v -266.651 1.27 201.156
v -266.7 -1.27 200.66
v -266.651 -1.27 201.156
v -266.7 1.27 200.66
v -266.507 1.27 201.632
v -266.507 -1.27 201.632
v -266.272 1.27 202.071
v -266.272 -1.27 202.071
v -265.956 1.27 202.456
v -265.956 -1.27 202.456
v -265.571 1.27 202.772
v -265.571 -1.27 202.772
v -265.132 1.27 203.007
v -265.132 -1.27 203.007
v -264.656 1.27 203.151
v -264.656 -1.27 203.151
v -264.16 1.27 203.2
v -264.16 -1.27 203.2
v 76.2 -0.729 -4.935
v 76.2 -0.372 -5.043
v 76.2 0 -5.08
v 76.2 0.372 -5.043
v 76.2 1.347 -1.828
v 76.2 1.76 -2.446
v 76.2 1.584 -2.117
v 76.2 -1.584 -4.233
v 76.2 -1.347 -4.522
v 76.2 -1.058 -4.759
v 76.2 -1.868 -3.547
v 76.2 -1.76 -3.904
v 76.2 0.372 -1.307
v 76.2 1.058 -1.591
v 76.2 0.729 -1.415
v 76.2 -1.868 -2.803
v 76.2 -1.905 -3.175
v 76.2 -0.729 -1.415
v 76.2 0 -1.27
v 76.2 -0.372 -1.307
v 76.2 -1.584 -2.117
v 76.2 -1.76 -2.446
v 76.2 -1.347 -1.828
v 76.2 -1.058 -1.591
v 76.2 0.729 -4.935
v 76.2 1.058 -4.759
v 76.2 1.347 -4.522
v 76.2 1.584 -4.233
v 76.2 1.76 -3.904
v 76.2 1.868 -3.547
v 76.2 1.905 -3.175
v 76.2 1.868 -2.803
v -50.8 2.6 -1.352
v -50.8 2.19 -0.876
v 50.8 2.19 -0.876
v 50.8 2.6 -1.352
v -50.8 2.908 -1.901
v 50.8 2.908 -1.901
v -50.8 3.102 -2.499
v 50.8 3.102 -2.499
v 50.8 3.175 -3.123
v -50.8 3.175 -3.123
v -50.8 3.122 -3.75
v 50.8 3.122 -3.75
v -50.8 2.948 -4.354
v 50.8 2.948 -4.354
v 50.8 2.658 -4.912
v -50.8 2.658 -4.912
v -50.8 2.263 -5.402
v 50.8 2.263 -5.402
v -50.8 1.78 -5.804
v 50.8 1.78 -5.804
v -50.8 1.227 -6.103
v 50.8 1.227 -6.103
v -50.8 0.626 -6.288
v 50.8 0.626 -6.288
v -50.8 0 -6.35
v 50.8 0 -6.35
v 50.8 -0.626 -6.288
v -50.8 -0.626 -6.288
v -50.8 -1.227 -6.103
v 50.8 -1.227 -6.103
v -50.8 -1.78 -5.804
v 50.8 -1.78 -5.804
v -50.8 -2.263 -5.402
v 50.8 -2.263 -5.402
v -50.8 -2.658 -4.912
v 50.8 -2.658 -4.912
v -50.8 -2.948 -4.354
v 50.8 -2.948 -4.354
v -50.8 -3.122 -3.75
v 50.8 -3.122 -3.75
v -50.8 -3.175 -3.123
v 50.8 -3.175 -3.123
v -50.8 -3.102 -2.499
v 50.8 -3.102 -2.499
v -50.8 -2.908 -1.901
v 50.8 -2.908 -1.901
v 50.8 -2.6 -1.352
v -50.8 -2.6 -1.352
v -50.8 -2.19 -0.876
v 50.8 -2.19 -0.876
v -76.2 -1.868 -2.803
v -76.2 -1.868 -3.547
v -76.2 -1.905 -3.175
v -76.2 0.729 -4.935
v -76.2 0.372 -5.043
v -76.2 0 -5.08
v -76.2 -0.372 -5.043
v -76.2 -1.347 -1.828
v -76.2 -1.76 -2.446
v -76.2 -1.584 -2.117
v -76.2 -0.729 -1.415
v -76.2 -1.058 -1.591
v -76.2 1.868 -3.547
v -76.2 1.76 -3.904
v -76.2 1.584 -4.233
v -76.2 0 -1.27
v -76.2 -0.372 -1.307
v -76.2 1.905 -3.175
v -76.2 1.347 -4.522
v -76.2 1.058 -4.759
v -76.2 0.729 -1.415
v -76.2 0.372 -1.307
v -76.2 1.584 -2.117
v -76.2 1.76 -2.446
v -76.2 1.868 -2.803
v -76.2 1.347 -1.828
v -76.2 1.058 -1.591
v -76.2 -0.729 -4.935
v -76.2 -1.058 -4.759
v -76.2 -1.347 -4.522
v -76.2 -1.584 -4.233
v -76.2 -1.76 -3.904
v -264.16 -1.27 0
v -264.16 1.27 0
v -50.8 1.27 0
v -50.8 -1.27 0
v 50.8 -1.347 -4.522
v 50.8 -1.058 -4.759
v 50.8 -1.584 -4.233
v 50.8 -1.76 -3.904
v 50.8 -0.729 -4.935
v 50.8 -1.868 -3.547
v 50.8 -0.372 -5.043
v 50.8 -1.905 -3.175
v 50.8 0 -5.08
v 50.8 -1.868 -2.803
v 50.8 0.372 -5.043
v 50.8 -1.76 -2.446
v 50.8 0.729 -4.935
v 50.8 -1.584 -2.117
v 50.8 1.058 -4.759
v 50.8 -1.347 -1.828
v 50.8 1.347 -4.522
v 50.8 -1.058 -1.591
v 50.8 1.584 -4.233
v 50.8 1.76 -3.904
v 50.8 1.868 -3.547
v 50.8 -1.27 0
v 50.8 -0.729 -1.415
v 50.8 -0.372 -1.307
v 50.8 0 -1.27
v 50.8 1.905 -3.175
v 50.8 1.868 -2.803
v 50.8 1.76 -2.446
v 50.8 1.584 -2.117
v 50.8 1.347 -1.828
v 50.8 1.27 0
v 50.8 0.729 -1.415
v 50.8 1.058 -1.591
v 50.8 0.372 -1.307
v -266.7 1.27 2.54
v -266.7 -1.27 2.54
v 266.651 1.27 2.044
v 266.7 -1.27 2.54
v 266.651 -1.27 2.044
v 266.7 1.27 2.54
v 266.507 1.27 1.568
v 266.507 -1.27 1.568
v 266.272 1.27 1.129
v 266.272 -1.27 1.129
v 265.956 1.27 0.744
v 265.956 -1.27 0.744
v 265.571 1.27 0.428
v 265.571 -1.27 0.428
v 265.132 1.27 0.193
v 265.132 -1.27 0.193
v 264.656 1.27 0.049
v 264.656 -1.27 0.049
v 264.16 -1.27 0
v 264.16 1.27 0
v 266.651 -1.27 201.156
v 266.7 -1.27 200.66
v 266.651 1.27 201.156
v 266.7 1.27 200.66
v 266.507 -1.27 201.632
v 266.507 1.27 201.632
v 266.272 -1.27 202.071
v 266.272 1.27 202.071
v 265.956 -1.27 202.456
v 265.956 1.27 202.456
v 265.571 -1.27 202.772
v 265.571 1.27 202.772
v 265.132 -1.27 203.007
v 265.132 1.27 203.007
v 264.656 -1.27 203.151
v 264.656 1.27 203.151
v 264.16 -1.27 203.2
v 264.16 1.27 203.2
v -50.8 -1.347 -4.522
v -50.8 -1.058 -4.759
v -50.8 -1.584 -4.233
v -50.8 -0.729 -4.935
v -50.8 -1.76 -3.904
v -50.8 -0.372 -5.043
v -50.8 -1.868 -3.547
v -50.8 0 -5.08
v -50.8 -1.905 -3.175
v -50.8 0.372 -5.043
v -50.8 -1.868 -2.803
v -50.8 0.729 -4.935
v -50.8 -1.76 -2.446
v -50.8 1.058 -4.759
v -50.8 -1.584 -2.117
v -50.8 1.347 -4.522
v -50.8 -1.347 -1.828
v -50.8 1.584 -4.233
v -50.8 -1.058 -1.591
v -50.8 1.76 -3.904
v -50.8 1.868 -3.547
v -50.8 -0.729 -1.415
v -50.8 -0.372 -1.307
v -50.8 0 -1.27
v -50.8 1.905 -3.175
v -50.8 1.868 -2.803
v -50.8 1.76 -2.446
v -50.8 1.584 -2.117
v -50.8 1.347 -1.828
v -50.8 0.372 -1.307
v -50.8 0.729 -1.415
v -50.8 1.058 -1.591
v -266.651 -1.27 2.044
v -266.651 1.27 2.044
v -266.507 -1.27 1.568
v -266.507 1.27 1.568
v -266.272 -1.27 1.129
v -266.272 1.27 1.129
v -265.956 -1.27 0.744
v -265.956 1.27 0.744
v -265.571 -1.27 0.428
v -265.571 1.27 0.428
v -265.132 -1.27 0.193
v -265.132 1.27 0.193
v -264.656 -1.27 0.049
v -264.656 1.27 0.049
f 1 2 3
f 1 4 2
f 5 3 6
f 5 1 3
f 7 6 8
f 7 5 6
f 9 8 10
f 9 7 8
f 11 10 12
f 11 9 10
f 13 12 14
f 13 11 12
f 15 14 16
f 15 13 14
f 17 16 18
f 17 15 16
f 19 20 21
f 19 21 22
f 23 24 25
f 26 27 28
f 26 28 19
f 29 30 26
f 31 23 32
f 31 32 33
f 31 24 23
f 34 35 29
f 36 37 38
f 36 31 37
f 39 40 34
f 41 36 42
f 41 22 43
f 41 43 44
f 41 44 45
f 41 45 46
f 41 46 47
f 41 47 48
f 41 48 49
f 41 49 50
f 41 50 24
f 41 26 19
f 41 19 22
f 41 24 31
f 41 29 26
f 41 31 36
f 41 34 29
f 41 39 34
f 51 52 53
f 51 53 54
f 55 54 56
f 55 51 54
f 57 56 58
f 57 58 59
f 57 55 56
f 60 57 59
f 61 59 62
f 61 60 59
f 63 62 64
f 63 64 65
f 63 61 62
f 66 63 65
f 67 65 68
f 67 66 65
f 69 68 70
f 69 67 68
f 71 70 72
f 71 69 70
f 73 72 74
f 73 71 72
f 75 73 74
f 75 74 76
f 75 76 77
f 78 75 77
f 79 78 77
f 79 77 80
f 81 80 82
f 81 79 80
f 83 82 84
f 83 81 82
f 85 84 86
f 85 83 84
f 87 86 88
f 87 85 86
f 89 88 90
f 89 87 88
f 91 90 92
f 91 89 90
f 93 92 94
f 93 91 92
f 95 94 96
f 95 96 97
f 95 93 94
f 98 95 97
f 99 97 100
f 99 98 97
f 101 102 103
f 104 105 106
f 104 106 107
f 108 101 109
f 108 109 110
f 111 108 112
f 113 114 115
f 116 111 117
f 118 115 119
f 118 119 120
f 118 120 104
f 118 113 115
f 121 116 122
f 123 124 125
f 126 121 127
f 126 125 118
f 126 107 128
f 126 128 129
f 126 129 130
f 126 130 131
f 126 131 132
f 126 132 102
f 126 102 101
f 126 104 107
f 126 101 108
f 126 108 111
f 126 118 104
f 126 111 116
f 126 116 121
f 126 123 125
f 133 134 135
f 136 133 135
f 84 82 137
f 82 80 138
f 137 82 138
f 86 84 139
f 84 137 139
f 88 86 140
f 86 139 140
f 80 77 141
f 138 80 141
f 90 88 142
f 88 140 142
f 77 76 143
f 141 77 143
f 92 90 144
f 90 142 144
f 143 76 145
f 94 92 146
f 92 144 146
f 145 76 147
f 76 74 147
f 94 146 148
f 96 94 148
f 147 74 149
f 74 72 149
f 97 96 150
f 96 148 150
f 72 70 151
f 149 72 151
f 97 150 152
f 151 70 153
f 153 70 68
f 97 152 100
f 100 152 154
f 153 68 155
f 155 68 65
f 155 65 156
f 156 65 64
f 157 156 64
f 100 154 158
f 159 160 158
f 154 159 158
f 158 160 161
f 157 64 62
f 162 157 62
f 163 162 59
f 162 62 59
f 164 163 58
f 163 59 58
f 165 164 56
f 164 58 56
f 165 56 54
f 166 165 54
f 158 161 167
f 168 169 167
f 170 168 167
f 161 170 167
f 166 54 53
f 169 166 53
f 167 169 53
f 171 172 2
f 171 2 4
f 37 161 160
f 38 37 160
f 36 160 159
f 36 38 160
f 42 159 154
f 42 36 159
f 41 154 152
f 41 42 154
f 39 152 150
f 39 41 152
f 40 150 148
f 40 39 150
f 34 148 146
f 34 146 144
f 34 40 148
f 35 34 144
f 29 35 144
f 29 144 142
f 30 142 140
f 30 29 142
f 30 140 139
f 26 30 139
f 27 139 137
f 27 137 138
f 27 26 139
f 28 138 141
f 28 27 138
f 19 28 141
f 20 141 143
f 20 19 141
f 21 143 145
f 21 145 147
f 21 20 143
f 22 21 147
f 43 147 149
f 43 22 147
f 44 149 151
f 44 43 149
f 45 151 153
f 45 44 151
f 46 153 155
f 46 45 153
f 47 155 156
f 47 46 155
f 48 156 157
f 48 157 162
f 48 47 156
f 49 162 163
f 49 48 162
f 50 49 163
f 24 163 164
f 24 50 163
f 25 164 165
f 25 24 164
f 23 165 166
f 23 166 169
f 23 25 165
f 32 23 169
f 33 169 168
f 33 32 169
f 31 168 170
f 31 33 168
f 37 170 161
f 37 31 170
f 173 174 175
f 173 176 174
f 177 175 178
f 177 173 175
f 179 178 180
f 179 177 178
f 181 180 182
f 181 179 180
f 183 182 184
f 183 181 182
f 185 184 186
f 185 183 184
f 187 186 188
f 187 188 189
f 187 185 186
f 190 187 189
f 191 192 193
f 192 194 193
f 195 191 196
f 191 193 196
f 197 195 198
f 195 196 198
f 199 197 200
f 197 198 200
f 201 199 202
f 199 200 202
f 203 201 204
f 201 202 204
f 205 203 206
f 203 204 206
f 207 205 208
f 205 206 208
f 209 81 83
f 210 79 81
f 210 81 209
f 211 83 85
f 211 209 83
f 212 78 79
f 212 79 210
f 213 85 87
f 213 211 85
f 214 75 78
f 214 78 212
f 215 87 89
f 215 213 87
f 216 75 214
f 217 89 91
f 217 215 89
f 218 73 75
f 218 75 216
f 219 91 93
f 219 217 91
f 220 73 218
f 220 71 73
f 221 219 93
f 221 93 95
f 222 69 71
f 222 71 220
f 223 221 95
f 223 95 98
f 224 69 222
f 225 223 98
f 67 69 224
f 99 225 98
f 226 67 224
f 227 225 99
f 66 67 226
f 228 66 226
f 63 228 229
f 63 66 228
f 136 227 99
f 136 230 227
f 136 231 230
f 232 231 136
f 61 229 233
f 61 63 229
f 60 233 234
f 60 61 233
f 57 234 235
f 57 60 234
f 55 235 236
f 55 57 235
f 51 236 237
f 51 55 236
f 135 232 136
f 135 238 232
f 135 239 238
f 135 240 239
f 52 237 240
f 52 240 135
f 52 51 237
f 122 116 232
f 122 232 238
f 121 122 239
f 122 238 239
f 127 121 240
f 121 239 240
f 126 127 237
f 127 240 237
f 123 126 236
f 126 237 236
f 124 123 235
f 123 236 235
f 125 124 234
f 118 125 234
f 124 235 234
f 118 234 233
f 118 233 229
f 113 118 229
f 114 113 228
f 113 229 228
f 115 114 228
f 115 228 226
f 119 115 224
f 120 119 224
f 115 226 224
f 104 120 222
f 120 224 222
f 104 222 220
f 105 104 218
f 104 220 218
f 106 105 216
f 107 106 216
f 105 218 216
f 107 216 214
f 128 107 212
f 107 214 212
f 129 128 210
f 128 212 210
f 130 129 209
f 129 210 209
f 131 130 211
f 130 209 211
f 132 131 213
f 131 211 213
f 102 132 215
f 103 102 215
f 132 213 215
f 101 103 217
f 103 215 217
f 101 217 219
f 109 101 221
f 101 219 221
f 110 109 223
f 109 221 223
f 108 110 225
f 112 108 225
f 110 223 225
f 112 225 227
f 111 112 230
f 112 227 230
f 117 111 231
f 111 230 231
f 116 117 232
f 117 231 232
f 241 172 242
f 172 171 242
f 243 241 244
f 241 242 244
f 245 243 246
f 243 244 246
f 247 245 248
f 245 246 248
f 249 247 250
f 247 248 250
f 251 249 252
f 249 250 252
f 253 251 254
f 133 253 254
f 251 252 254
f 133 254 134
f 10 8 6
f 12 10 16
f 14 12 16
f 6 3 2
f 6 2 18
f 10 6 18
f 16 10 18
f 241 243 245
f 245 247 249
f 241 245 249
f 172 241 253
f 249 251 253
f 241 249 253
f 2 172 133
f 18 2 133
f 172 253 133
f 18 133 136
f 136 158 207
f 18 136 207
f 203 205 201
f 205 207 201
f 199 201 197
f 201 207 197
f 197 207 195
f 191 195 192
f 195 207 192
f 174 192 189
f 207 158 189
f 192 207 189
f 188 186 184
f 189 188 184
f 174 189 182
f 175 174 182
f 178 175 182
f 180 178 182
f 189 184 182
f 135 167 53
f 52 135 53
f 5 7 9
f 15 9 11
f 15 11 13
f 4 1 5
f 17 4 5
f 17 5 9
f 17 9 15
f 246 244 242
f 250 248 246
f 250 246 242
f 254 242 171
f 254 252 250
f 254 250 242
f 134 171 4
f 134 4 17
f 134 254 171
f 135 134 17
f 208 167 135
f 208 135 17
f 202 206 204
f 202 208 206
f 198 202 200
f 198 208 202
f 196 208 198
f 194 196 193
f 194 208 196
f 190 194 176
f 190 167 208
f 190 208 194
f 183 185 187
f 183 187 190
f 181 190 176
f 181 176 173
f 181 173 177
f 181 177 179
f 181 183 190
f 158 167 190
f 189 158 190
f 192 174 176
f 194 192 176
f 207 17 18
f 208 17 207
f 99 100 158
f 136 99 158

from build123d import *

# Parameters (mm, degrees)
SKETCH1_W           = 533.4
SKETCH1_H           = 2.54
BOSS_EXTRUDE1_DEPTH = 203.2
FILLET1_R           = 2.54
SKETCH3_R           = 3.175
BOSS_EXTRUDE2_DEPTH = 101.6
SKETCH5_R           = 1.905
BOSS_EXTRUDE3_DEPTH = 25.4
BOSS_EXTRUDE4_START = 25.4
SKETCH6_R           = 1.905
BOSS_EXTRUDE4_DEPTH = 25.4


with BuildPart() as part:
    # Sketch1 → Boss-Extrude1 (new body)
    with BuildSketch(Plane.XY):
        Rectangle(SKETCH1_W, SKETCH1_H)
    extrude(amount=BOSS_EXTRUDE1_DEPTH)

    # Fillet1
    fillet1_edges = [part.edges().sort_by_distance(p)[0] for p in [
        (-266.7, 0, 203.2),
        (266.7, 0, 203.2),
        (-266.7, 0, 0),
        (266.7, 0, 0),
    ]]
    fillet(fillet1_edges, radius=FILLET1_R)

    # Sketch3 → Boss-Extrude2 (add)
    with BuildSketch(Plane.ZY.offset(50.8)):
        with BuildLine():
            ThreePointArc((-0.875862069, 2.189655172), (-0.227086506, 1.179165397), (0, 0))
            Line((0, 0), (0, 1.27))
            Line((0, 1.27), (-0.875862069, 2.189655172))
        make_face()
        with BuildLine():
            Line((-0.875862069, -2.189655172), (0, -1.27))
            Line((0, -1.27), (0, 0))
            ThreePointArc((0, 0), (-0.227086506, -1.179165397), (-0.875862069, -2.189655172))
        make_face()
        with Locations((-3.175, 0)):
            Circle(SKETCH3_R)
    extrude(amount=-BOSS_EXTRUDE2_DEPTH)

    # Sketch5 → Boss-Extrude3 (add)
    with BuildSketch(Plane.ZY.offset(50.8)):
        with Locations((-3.175, 0)):
            Circle(SKETCH5_R)
    extrude(amount=BOSS_EXTRUDE3_DEPTH)

    # Sketch6 → Boss-Extrude4 (add)
    with BuildSketch(Plane(origin=(50.8, 0, 0), x_dir=(0, 0, -1), z_dir=(1, 0, 0)).offset(BOSS_EXTRUDE4_START)):
        with Locations(Location((3.175, 0, 0), (0, 0, 180))):
            Circle(SKETCH6_R)
    extrude(amount=-BOSS_EXTRUDE4_DEPTH)


solid = part.part
